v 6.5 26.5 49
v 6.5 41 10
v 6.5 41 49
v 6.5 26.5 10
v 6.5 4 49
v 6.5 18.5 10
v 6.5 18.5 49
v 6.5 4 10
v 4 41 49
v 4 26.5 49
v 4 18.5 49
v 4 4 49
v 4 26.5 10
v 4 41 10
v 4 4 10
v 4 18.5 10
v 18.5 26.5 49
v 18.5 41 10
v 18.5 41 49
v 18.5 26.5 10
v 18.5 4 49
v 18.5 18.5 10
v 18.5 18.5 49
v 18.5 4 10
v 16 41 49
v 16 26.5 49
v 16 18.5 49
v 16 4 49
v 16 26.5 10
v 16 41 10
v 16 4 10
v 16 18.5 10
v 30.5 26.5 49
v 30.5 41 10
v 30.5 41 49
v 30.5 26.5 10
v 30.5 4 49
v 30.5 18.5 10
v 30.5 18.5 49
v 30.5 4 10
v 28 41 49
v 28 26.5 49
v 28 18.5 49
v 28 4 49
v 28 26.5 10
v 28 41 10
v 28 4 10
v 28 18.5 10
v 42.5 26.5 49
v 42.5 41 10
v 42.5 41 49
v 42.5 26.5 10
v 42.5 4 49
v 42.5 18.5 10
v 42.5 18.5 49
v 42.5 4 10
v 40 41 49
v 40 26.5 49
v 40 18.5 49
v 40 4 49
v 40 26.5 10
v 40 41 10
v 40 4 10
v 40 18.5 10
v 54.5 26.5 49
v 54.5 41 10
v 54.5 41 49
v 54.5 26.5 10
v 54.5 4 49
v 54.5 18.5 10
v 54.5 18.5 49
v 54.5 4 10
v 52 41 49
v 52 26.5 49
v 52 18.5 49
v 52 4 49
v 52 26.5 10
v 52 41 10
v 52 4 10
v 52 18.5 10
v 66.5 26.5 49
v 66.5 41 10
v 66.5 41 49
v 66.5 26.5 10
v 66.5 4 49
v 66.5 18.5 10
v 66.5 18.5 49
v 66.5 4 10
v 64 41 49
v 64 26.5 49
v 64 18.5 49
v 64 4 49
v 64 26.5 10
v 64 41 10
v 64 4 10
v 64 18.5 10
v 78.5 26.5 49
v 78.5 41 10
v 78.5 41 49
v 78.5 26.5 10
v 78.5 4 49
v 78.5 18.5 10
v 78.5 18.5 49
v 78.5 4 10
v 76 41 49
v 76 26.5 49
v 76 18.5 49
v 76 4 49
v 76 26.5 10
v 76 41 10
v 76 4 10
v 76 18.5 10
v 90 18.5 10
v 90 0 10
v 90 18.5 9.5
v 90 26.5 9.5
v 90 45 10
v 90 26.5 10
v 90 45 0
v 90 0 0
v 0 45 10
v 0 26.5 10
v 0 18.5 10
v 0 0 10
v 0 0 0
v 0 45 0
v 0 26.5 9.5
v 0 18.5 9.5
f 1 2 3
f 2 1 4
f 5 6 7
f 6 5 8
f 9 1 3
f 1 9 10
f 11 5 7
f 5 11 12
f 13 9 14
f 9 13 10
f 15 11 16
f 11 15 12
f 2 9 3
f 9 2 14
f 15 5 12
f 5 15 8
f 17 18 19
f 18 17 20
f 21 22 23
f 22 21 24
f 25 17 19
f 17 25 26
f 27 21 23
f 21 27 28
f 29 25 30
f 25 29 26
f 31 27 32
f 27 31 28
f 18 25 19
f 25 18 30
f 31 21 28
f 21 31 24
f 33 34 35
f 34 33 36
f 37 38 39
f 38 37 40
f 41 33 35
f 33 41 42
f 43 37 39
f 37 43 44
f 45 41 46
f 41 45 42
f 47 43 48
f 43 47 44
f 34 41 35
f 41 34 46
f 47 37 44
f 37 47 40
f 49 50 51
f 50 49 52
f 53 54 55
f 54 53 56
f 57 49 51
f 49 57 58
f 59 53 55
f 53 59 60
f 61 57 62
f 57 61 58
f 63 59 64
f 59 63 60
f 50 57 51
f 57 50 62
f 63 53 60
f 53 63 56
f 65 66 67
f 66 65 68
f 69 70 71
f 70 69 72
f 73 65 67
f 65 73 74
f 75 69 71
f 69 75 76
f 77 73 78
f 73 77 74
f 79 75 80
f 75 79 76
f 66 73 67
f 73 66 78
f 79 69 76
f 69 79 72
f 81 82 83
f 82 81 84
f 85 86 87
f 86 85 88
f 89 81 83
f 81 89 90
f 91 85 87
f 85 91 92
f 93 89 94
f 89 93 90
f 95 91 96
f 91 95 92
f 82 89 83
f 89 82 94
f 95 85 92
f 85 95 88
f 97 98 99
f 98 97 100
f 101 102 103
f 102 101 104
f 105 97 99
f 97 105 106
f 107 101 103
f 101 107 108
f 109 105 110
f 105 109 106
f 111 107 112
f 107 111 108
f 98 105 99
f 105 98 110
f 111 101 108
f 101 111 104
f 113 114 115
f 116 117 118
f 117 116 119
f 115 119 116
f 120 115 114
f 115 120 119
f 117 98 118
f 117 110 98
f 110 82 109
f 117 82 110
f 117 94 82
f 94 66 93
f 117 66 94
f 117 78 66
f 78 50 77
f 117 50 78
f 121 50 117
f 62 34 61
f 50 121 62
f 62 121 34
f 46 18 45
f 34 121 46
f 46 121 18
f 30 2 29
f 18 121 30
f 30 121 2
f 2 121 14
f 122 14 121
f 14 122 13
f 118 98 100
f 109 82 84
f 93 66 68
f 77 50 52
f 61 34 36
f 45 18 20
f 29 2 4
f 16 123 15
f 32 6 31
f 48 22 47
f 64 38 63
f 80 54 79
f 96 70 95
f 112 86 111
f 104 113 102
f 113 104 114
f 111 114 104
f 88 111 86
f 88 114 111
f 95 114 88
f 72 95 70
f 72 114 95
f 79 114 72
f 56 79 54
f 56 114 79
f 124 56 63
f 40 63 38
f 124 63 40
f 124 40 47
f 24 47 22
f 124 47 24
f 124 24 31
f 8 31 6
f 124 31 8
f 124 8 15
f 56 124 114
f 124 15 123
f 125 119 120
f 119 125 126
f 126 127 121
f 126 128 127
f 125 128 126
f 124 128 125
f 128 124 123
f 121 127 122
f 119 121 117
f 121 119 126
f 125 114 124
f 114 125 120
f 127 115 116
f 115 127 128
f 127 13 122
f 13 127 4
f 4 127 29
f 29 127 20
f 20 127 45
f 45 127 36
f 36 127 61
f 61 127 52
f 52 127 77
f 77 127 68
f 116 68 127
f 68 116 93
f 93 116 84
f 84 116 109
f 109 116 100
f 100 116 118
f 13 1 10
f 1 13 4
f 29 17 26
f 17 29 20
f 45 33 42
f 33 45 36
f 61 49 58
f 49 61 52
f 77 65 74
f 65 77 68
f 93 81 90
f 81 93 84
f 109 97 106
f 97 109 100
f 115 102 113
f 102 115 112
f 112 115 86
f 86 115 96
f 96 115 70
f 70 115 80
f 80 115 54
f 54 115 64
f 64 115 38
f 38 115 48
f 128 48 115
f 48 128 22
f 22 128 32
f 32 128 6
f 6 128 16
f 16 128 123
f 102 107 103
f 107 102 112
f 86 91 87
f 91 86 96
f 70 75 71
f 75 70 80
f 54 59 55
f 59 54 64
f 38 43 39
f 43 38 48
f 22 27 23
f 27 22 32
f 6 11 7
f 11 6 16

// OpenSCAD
$fn = 32;

// ----------------------------------------------------------------------
// Heatsink: slotted fin block
// ----------------------------------------------------------------------

// --- parameters (mm) ---
base_l = 90;              // base length, X
base_w = 45;              // base width, Y
base_t = 10;              // base plate thickness
fin_h = 40;               // fin height above the base
fin_t = 2.5;              // fin thickness
edge = 4;                 // margin from the base ends
pitch = 12;               // fin pitch
slot_w = 8;               // central slot width, Y
fit_tol = 0.1;            // tolerance for press fits, mm
free_tol = 0.3;           // tolerance for clearance fits, mm

n_fins = floor((base_l - 2 * edge - fin_t) / pitch) + 1;  // fin count
total_h = base_t + fin_h - 1;  // overall height

difference() {
union() {
  cube([base_l, base_w, base_t]);
  for (i = [0 : n_fins - 1])
    translate([edge + i * pitch, edge, base_t - 1])
      cube([fin_t, base_w - 2 * edge, fin_h]);
}
  translate([-1, base_w / 2 - slot_w / 2, base_t - 0.5])
    cube([base_l + 2, slot_w, fin_h + 2]);
}
